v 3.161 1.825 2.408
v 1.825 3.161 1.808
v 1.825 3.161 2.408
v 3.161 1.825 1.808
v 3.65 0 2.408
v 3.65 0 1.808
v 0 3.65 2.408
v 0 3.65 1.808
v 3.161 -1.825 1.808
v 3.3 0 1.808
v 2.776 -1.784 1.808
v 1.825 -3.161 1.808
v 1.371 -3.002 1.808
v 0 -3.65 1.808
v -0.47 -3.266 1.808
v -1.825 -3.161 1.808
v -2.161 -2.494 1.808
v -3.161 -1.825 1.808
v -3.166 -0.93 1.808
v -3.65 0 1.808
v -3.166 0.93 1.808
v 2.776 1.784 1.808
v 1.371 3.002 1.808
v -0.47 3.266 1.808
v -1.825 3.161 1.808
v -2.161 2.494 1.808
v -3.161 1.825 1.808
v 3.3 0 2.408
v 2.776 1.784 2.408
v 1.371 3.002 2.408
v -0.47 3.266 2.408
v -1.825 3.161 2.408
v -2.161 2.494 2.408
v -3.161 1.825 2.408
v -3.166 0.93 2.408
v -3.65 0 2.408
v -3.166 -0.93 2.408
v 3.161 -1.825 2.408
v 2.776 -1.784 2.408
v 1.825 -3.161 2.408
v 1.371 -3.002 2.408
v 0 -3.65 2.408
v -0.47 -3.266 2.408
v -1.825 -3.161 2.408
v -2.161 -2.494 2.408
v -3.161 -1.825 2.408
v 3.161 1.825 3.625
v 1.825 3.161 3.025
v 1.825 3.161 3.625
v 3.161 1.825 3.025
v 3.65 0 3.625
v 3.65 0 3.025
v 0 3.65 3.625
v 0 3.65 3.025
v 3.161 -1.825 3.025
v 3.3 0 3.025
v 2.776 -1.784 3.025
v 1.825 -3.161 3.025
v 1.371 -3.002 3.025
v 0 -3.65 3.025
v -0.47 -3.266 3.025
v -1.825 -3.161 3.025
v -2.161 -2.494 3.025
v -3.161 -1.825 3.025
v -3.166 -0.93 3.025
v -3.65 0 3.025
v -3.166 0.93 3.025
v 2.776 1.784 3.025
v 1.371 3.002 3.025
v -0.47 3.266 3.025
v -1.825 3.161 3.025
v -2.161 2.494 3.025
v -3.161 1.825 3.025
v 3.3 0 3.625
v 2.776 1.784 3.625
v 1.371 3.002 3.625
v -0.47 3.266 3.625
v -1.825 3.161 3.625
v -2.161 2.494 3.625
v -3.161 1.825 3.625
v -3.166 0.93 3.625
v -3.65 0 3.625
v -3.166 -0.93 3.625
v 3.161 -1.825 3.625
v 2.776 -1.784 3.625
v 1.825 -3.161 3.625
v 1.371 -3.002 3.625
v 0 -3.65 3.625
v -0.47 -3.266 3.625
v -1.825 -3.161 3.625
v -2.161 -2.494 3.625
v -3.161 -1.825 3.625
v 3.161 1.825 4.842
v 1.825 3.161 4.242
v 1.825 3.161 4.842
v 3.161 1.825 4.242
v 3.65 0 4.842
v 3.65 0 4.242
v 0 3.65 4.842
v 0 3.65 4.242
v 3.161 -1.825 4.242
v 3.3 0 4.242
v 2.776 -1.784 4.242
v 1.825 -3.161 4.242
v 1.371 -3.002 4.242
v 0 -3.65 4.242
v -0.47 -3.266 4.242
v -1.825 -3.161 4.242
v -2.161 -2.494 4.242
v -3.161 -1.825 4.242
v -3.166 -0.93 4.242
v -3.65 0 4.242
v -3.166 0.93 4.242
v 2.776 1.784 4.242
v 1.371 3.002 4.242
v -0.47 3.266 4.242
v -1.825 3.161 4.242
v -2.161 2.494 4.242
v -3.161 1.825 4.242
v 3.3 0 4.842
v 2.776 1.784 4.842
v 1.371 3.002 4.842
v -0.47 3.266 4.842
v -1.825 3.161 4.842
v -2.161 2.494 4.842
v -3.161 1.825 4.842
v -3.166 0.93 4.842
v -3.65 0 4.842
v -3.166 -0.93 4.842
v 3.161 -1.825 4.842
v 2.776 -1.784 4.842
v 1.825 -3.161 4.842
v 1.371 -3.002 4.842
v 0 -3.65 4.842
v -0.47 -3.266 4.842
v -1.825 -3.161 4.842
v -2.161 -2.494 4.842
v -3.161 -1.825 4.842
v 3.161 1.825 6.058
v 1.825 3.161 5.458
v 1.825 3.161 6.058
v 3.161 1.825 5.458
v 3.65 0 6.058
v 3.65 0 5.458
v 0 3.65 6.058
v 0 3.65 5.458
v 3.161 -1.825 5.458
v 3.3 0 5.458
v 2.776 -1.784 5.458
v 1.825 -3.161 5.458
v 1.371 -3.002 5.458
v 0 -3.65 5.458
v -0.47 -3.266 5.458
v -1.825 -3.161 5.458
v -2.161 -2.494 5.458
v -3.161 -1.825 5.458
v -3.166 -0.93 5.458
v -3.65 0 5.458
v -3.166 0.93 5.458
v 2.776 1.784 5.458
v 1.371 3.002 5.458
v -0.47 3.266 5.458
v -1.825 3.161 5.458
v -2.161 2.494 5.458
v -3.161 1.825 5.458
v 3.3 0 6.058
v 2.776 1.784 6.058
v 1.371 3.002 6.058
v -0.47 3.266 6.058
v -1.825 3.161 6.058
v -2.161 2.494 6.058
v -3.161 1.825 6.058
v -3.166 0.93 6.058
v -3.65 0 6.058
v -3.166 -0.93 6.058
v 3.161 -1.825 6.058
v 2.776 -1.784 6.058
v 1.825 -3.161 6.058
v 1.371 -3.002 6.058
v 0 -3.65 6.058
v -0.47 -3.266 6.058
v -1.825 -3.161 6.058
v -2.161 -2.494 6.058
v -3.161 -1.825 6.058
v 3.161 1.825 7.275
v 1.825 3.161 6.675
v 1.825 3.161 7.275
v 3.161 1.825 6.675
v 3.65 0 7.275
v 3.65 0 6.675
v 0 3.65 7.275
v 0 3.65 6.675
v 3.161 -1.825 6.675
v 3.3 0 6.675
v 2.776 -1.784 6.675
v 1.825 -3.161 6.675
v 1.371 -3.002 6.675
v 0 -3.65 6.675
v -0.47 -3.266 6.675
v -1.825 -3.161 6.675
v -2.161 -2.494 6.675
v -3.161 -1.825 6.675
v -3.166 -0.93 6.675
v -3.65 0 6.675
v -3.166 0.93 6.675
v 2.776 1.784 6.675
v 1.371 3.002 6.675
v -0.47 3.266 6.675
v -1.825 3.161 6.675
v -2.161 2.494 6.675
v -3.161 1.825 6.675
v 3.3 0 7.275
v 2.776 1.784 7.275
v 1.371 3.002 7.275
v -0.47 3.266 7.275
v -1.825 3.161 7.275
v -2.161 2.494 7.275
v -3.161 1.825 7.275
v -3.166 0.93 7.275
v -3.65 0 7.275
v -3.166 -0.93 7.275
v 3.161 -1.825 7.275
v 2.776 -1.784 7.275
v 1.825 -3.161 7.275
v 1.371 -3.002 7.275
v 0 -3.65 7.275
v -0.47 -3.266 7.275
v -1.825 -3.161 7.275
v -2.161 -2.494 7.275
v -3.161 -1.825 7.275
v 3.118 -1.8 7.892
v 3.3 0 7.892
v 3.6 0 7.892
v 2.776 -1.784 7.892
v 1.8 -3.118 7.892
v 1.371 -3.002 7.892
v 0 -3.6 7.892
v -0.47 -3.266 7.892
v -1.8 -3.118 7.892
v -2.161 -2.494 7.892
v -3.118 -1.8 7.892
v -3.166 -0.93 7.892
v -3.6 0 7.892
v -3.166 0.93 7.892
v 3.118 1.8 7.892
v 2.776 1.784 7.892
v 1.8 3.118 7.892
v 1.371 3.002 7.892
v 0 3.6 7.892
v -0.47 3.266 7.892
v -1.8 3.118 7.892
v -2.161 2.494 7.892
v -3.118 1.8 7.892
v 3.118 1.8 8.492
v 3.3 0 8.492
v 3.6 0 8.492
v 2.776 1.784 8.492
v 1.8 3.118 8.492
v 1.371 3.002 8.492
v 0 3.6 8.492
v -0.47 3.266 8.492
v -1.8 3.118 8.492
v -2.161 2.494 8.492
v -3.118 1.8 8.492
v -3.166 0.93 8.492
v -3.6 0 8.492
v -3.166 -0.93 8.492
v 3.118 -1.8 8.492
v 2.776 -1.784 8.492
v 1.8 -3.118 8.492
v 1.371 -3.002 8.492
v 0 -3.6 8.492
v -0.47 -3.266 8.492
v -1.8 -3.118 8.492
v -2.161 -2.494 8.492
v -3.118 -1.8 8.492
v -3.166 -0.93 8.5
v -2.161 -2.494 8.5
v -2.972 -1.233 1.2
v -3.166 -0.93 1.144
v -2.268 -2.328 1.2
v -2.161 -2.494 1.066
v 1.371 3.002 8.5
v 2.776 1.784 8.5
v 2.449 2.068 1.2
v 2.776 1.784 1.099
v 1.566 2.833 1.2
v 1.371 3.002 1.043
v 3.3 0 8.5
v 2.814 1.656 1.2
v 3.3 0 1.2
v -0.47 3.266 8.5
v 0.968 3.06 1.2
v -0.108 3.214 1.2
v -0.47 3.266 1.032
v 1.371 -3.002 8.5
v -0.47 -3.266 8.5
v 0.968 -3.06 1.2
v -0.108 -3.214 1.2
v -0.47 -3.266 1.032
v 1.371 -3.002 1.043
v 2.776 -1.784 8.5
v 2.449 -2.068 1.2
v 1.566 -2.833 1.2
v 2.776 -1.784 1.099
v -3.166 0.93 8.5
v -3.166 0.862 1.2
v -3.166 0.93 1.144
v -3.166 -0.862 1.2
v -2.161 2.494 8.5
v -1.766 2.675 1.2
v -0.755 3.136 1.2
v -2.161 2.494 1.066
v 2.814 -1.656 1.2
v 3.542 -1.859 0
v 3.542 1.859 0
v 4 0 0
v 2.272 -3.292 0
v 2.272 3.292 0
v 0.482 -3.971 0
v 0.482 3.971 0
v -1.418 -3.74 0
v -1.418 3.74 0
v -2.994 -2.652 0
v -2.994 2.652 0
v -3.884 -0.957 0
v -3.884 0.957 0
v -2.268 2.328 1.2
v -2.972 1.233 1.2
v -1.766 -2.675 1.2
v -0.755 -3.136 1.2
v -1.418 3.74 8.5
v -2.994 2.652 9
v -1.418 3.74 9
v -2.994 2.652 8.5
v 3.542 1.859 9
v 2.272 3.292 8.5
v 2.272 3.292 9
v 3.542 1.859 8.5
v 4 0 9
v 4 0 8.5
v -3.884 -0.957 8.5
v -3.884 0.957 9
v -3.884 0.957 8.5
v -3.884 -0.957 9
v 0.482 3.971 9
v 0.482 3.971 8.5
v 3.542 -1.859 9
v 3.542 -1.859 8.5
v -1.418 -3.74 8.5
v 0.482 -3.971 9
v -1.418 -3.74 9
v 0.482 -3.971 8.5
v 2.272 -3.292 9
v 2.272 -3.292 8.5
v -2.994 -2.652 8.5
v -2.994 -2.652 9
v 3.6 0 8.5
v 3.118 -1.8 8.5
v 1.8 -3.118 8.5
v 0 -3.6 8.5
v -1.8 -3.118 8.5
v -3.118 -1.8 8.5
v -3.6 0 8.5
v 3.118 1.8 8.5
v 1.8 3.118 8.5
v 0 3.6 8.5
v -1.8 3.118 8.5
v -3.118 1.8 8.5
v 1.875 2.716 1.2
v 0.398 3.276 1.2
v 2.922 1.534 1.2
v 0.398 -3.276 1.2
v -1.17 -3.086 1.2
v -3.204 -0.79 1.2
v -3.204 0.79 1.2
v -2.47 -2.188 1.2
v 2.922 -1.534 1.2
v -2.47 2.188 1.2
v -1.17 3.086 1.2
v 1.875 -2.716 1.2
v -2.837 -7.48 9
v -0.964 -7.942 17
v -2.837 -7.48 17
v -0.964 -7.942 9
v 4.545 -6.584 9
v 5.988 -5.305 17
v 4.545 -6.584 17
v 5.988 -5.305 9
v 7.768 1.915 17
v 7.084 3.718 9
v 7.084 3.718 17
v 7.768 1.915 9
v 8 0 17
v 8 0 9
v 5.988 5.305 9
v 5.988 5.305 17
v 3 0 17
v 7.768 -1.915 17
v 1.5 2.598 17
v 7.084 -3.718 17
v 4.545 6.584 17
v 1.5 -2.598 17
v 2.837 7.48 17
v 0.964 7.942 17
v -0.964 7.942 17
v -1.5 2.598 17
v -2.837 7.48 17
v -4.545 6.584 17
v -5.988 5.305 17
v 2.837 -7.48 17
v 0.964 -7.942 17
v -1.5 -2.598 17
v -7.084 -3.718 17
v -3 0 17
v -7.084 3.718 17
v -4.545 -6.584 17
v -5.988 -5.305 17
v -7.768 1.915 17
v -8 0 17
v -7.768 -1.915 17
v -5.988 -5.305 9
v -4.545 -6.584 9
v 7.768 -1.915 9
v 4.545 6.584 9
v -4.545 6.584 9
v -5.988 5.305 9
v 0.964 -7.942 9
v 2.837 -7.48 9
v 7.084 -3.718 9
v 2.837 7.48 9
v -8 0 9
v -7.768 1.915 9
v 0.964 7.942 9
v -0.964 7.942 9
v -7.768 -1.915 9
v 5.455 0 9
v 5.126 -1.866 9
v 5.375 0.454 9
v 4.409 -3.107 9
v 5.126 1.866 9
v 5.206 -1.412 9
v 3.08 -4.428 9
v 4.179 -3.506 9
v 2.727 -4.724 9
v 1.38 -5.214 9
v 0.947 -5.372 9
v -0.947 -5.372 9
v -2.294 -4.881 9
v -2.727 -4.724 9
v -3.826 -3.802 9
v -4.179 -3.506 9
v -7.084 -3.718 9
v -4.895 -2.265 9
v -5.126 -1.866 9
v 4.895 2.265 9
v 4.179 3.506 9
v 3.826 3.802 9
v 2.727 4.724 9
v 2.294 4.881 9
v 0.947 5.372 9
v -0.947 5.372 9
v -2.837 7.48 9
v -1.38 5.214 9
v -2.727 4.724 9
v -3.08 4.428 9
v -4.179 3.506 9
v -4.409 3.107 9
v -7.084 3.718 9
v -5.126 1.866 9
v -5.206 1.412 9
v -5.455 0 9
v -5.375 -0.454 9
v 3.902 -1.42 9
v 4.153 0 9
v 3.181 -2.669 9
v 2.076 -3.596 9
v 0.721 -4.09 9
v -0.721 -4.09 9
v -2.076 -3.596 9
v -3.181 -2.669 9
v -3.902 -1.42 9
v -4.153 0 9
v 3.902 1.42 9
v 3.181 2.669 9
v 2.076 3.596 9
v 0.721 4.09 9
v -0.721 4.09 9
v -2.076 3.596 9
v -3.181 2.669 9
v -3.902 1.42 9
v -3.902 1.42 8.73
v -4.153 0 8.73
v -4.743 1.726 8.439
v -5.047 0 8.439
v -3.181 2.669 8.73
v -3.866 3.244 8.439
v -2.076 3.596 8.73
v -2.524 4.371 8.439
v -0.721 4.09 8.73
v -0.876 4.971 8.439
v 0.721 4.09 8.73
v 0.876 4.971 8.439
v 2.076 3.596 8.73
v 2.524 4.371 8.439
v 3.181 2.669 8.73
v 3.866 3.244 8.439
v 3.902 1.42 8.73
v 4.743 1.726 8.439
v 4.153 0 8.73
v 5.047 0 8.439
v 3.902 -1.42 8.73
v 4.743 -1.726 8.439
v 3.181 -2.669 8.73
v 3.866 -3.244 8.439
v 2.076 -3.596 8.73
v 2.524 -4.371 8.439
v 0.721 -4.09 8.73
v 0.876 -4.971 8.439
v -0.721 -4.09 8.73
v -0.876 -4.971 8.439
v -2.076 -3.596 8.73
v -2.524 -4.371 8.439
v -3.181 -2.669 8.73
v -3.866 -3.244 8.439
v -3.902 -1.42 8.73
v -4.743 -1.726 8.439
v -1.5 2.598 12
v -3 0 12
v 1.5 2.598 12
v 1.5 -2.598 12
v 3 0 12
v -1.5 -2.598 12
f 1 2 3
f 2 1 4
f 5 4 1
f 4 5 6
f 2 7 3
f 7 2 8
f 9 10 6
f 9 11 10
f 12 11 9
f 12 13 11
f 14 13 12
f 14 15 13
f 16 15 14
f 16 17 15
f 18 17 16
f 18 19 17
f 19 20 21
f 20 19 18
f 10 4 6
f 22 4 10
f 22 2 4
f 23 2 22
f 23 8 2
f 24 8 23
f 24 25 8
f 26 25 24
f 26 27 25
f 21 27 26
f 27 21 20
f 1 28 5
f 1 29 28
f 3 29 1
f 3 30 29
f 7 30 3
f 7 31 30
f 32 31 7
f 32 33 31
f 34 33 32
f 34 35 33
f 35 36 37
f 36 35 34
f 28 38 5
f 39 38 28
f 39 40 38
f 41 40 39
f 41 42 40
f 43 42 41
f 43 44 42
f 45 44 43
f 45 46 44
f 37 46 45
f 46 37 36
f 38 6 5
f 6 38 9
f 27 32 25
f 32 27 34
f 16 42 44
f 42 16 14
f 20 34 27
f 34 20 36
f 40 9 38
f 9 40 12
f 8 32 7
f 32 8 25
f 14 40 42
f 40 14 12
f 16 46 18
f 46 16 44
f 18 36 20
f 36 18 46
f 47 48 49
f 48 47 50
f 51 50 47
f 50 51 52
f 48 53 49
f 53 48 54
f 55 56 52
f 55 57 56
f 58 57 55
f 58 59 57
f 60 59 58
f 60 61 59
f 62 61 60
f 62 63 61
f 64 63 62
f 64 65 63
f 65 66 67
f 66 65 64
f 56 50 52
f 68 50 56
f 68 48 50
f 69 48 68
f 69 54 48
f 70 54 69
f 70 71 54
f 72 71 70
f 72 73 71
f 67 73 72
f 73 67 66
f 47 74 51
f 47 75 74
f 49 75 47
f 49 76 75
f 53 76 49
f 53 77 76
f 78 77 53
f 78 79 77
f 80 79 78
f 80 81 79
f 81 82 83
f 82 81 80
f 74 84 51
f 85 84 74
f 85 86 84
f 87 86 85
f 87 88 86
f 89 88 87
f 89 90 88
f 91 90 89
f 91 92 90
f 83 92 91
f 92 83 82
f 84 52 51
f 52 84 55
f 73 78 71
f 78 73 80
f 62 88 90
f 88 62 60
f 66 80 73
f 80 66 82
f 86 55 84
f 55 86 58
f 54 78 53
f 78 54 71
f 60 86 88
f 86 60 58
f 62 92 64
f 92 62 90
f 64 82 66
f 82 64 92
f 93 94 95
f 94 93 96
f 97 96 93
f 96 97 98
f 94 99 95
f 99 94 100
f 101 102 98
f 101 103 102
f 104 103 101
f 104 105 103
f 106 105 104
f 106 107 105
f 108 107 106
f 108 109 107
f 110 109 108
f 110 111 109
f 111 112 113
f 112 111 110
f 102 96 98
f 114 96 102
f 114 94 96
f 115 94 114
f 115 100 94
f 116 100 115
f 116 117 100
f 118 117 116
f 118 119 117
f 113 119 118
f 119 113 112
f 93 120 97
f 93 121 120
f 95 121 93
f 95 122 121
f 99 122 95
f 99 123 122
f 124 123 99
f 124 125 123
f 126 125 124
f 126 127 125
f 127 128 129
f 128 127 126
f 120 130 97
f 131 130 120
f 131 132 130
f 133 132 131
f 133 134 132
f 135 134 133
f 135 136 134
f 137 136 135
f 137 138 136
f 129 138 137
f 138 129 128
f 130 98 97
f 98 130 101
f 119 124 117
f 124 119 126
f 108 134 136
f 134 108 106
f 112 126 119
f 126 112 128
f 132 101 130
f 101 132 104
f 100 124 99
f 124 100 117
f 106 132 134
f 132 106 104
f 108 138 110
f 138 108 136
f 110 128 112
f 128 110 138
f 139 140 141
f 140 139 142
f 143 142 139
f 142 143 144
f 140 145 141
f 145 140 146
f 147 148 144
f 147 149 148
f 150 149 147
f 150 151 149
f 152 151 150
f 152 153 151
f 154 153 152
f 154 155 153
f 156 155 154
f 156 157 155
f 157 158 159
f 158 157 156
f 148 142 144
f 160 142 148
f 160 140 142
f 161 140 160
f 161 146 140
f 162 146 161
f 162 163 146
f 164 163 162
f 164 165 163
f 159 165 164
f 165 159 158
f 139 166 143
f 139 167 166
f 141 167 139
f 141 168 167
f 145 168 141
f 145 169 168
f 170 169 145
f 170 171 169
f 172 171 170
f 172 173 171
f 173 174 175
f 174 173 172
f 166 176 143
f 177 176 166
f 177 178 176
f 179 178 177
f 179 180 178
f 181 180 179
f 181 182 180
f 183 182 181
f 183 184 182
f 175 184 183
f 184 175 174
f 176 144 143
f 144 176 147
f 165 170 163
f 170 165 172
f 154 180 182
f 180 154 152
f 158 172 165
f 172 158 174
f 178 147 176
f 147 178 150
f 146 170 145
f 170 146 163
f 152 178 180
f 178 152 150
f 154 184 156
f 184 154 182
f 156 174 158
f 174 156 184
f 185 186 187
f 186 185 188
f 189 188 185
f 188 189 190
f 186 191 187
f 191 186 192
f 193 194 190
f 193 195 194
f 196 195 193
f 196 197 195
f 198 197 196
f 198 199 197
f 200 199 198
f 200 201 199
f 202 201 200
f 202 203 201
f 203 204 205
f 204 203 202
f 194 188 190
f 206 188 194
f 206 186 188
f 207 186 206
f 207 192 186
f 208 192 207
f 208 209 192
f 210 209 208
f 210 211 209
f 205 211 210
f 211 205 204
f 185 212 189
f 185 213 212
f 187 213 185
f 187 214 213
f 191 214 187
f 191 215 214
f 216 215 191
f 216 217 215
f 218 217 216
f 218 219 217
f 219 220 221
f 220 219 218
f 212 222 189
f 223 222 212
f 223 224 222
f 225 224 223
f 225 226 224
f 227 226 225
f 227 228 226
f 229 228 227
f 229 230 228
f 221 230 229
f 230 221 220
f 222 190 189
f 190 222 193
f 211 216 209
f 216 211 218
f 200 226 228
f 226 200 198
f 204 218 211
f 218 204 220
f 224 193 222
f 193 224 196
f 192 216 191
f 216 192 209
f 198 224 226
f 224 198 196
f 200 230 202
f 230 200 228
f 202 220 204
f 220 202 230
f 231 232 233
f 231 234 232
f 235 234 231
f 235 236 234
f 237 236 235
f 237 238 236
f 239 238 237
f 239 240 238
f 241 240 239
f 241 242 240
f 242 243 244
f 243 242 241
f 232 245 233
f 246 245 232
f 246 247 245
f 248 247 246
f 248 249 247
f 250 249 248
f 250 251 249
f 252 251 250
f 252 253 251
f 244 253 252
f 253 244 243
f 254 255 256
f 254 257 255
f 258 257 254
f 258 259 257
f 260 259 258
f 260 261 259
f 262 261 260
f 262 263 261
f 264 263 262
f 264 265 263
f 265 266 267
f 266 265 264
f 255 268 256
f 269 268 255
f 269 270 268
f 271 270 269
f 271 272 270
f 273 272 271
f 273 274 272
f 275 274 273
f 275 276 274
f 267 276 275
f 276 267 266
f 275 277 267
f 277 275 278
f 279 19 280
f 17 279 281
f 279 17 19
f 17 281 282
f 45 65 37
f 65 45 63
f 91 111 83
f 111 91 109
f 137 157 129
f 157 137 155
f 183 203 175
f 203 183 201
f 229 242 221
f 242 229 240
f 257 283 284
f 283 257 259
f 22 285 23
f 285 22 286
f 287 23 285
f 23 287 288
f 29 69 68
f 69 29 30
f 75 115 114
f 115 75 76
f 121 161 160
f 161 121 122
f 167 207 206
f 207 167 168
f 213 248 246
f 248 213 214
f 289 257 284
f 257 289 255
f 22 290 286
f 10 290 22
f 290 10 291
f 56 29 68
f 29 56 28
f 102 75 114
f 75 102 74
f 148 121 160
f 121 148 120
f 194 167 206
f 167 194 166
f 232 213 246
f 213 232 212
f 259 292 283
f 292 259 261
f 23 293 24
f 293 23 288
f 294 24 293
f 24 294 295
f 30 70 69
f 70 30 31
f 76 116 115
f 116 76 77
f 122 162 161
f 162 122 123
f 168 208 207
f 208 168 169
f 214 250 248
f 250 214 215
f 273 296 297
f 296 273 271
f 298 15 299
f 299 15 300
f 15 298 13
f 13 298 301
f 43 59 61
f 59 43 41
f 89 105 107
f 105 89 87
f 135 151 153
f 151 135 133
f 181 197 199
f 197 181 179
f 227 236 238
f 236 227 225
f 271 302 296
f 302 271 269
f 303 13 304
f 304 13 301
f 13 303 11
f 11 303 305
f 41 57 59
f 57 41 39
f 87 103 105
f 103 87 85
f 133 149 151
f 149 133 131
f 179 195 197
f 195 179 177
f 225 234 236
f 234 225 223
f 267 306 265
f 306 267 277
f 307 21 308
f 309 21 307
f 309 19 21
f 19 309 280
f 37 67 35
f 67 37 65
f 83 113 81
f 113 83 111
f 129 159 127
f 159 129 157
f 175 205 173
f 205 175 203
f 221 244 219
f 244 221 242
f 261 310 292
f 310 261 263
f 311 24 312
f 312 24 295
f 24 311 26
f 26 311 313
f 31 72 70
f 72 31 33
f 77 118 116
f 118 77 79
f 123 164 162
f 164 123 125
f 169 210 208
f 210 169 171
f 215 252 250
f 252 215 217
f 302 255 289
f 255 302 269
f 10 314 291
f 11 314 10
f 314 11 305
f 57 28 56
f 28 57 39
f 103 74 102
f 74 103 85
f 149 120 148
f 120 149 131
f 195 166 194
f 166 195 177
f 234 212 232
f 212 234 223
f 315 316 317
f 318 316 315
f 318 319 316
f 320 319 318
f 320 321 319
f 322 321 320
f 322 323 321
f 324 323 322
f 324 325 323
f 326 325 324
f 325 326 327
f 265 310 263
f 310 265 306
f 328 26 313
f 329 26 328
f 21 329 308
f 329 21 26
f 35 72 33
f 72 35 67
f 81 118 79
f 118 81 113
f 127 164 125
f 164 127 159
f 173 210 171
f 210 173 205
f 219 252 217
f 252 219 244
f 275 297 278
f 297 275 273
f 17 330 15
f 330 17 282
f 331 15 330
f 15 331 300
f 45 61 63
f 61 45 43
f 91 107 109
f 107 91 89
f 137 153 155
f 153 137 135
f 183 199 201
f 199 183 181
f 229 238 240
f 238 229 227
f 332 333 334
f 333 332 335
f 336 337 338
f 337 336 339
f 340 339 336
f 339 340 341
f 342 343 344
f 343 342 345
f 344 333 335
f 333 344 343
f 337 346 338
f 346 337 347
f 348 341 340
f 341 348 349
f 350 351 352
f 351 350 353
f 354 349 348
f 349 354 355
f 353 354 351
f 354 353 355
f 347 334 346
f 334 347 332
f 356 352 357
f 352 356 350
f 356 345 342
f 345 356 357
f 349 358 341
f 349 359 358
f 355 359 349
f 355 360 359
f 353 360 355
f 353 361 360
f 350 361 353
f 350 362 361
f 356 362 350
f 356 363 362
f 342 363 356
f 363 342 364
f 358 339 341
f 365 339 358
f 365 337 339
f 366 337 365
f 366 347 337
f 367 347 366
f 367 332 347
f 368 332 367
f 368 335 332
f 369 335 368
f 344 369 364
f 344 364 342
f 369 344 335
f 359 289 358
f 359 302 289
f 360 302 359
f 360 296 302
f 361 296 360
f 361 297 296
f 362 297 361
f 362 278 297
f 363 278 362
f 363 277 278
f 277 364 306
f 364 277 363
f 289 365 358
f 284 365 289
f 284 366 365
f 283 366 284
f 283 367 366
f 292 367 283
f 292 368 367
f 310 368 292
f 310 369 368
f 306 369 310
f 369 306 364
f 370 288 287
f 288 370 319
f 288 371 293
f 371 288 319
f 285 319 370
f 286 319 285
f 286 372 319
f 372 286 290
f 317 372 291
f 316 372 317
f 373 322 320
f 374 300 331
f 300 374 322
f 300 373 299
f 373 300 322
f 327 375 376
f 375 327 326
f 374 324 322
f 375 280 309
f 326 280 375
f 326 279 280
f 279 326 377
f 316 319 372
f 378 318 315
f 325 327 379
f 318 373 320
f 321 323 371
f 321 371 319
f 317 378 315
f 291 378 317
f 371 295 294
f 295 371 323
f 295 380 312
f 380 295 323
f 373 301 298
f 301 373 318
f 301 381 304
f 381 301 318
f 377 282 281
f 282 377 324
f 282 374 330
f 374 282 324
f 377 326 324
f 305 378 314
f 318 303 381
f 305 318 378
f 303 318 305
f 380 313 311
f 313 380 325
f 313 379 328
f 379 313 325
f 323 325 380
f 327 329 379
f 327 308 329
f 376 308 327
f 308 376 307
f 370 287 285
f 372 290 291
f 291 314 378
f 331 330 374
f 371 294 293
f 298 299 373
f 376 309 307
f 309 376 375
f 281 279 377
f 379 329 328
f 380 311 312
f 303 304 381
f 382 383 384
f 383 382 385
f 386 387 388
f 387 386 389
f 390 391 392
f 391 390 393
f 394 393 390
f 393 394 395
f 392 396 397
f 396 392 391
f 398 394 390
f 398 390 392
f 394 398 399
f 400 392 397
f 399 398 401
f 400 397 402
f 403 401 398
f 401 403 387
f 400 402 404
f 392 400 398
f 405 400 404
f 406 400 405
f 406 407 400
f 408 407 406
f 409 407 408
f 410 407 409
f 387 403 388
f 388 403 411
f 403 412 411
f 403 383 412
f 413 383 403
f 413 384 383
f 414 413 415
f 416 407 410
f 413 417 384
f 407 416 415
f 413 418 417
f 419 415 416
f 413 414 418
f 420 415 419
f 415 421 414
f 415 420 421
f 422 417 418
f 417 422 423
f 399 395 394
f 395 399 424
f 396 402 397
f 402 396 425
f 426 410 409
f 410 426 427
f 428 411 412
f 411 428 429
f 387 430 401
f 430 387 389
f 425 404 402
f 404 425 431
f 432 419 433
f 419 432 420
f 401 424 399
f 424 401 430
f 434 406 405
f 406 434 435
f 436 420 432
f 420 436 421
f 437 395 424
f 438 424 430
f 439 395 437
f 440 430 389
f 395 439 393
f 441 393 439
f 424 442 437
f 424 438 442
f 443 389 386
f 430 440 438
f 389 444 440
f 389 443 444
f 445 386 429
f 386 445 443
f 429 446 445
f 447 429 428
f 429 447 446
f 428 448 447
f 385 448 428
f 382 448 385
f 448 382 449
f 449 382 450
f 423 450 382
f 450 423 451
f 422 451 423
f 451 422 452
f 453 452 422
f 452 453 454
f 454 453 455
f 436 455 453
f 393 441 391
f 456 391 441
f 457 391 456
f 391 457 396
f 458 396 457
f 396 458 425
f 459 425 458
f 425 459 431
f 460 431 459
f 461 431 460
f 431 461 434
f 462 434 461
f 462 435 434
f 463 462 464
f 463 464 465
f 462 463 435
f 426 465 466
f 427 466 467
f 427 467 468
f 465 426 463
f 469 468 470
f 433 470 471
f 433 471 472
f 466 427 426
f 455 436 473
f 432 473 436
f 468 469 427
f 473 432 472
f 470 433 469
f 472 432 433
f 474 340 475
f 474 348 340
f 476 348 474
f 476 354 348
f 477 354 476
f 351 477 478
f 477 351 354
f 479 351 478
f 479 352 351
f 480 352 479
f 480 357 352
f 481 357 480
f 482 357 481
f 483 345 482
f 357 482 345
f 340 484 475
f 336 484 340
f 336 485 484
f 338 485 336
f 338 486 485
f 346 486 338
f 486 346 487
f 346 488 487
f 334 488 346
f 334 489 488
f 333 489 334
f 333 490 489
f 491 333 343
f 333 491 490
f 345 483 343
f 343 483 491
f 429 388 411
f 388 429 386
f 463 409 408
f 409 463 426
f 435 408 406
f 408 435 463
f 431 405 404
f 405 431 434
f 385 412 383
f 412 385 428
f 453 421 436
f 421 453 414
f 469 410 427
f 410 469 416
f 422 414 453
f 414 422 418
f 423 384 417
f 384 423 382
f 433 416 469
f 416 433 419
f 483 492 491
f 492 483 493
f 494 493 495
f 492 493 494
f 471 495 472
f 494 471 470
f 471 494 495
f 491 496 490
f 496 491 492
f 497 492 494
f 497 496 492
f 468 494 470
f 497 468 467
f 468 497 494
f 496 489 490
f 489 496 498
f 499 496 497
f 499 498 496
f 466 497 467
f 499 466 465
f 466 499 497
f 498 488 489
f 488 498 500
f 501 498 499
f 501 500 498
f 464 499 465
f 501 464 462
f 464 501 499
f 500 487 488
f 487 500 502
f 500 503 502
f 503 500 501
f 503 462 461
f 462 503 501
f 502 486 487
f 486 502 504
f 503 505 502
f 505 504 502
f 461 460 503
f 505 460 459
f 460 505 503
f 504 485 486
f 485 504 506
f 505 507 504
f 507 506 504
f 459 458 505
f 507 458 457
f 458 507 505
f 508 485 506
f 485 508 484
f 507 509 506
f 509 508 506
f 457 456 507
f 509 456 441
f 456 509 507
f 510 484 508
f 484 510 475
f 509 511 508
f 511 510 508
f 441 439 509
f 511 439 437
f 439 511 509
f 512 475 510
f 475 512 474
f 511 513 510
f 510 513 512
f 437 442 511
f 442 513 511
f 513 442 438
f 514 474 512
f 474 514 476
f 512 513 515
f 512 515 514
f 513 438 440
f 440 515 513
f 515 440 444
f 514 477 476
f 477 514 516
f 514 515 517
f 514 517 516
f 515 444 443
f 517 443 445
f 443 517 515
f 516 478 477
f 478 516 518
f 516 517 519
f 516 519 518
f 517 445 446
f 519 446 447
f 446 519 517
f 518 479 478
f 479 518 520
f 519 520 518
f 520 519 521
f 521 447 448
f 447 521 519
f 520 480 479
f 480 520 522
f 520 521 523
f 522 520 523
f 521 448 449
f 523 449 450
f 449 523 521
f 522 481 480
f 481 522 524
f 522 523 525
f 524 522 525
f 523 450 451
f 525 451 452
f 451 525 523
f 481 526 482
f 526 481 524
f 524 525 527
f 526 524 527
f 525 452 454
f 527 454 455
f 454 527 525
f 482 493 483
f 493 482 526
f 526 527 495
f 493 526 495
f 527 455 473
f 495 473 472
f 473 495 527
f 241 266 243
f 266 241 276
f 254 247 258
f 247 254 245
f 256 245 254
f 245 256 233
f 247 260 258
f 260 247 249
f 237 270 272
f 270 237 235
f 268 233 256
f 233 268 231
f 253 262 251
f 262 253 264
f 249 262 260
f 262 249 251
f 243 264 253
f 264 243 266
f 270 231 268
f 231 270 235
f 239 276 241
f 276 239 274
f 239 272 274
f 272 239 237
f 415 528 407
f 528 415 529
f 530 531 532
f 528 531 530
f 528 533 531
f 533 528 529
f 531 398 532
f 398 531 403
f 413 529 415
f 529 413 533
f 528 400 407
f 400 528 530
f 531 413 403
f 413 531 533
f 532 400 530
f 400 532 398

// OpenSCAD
// Parameters
thread_major_d = 8; //[4:16:0.1]
length_under_head = 10; //[5:20:0.5]
head_d = 16; //[8:32:0.5]
head_h = 8; //[4:16:0.5]
socket_hex_af = 6; //[3:12:0.1]
socket_depth = 4; //[2:8:0.1]
thread_pitch = 1.25; //[0.5:3:0.05]
overlap = 1; //[0.5:2:0.1]
thread_minor_d = 6.6; //[3.3:13.2:0.1]
thread_relief_d = 7.2; //[3.6:14.4:0.1]
thread_relief_w = 1.2; //[0.6:2.4:0.1]
thread_runout_len = 1.5; //[0.8:3:0.1]
lead_in_len = 1.2; //[0.6:2.4:0.1]
head_top_chamfer_h = 0.8; //[0.4:1.6:0.1]
head_top_chamfer_d2 = 14.4; //[7.2:28.8:0.1]
underhead_fillet_r = 0.8; //[0.4:1.6:0.1]
thread_ring_h = 0.6; //[0.3:1.2:0.05]
thread_ring_count = 6; //[3:16:1]
thread_ring_radial = 0.35; //[0.15:0.8:0.05]

// Base Shapes
module socket_head() {
  translate([0, 0, length_under_head + head_h/2 - overlap])
    cylinder(h = head_h, r = head_d/2, center = true);
}

module threaded_shank_core() {
  translate([0, 0, length_under_head/2])
    cylinder(h = length_under_head, r = thread_minor_d/2, center = true);
}

module thread_ring(pos) {
  translate([0, 0, pos])
    cylinder(h = thread_ring_h, r = thread_minor_d/2 + thread_ring_radial, center = true);
}

module thread_rings_union() {
  union() {
    for (i = [0:thread_ring_count-1]) {
      thread_ring(thread_runout_len + (i+0.5)*(length_under_head - thread_runout_len - lead_in_len)/thread_ring_count);
    }
  }
}

module thread_runout() {
  translate([0, 0, length_under_head - thread_runout_len/2])
    cylinder(h = thread_runout_len, r = thread_major_d/2, center = true);
}

module lead_in_chamfer() {
  translate([0, 0, lead_in_len/2])
    cylinder(h = lead_in_len, r1 = thread_major_d/2, r2 = thread_minor_d/2, center = true);
}

module head_top_chamfer() {
  translate([0, 0, length_under_head + head_h - head_top_chamfer_h/2 - overlap])
    cylinder(h = head_top_chamfer_h, r1 = head_d/2, r2 = head_top_chamfer_d2/2, center = true);
}

module underhead_bearing_face() {
  translate([0, 0, length_under_head - overlap/2])
    cylinder(h = overlap, r = head_d/2, center = true);
}

module thread_relief_outer() {
  translate([0, 0, length_under_head - thread_runout_len - thread_relief_w/2])
    cylinder(h = thread_relief_w, r = thread_major_d/2, center = true);
}

module thread_relief_inner() {
  translate([0, 0, length_under_head - thread_runout_len - thread_relief_w/2])
    cylinder(h = thread_relief_w + overlap, r = thread_relief_d/2, center = true);
}

module underhead_fillet_torus() {
  translate([0, 0, length_under_head - underhead_fillet_r])
    rotate_extrude() translate([thread_major_d/2 + underhead_fillet_r, 0])
      circle(r = underhead_fillet_r);
}

module hex_socket_recess() {
  translate([0, 0, length_under_head + head_h - (socket_depth + overlap)/2 - overlap])
    linear_extrude(height = socket_depth + overlap, center = true)
      polygon(points = [
        [socket_hex_af/2, 0],
        [socket_hex_af/4, socket_hex_af*0.4330127019],
        [-socket_hex_af/4, socket_hex_af*0.4330127019],
        [-socket_hex_af/2, 0],
        [-socket_hex_af/4, -socket_hex_af*0.4330127019],
        [socket_hex_af/4, -socket_hex_af*0.4330127019]
      ]);
}

// Operations
module thread_relief_groove() {
  difference() {
    thread_relief_outer();
    thread_relief_inner();
  }
}

module threaded_shank() {
  union() {
    threaded_shank_core();
    thread_rings_union();
    thread_runout();
    lead_in_chamfer();
  }
}

module screw_body_pre_socket() {
  union() {
    socket_head();
    head_top_chamfer();
    underhead_bearing_face();
    threaded_shank();
    underhead_fillet_torus();
  }
}

module screw_body_with_relief() {
  difference() {
    screw_body_pre_socket();
    thread_relief_groove();
  }
}

// Final Model
difference() {
  screw_body_with_relief();
  hex_socket_recess();
}
